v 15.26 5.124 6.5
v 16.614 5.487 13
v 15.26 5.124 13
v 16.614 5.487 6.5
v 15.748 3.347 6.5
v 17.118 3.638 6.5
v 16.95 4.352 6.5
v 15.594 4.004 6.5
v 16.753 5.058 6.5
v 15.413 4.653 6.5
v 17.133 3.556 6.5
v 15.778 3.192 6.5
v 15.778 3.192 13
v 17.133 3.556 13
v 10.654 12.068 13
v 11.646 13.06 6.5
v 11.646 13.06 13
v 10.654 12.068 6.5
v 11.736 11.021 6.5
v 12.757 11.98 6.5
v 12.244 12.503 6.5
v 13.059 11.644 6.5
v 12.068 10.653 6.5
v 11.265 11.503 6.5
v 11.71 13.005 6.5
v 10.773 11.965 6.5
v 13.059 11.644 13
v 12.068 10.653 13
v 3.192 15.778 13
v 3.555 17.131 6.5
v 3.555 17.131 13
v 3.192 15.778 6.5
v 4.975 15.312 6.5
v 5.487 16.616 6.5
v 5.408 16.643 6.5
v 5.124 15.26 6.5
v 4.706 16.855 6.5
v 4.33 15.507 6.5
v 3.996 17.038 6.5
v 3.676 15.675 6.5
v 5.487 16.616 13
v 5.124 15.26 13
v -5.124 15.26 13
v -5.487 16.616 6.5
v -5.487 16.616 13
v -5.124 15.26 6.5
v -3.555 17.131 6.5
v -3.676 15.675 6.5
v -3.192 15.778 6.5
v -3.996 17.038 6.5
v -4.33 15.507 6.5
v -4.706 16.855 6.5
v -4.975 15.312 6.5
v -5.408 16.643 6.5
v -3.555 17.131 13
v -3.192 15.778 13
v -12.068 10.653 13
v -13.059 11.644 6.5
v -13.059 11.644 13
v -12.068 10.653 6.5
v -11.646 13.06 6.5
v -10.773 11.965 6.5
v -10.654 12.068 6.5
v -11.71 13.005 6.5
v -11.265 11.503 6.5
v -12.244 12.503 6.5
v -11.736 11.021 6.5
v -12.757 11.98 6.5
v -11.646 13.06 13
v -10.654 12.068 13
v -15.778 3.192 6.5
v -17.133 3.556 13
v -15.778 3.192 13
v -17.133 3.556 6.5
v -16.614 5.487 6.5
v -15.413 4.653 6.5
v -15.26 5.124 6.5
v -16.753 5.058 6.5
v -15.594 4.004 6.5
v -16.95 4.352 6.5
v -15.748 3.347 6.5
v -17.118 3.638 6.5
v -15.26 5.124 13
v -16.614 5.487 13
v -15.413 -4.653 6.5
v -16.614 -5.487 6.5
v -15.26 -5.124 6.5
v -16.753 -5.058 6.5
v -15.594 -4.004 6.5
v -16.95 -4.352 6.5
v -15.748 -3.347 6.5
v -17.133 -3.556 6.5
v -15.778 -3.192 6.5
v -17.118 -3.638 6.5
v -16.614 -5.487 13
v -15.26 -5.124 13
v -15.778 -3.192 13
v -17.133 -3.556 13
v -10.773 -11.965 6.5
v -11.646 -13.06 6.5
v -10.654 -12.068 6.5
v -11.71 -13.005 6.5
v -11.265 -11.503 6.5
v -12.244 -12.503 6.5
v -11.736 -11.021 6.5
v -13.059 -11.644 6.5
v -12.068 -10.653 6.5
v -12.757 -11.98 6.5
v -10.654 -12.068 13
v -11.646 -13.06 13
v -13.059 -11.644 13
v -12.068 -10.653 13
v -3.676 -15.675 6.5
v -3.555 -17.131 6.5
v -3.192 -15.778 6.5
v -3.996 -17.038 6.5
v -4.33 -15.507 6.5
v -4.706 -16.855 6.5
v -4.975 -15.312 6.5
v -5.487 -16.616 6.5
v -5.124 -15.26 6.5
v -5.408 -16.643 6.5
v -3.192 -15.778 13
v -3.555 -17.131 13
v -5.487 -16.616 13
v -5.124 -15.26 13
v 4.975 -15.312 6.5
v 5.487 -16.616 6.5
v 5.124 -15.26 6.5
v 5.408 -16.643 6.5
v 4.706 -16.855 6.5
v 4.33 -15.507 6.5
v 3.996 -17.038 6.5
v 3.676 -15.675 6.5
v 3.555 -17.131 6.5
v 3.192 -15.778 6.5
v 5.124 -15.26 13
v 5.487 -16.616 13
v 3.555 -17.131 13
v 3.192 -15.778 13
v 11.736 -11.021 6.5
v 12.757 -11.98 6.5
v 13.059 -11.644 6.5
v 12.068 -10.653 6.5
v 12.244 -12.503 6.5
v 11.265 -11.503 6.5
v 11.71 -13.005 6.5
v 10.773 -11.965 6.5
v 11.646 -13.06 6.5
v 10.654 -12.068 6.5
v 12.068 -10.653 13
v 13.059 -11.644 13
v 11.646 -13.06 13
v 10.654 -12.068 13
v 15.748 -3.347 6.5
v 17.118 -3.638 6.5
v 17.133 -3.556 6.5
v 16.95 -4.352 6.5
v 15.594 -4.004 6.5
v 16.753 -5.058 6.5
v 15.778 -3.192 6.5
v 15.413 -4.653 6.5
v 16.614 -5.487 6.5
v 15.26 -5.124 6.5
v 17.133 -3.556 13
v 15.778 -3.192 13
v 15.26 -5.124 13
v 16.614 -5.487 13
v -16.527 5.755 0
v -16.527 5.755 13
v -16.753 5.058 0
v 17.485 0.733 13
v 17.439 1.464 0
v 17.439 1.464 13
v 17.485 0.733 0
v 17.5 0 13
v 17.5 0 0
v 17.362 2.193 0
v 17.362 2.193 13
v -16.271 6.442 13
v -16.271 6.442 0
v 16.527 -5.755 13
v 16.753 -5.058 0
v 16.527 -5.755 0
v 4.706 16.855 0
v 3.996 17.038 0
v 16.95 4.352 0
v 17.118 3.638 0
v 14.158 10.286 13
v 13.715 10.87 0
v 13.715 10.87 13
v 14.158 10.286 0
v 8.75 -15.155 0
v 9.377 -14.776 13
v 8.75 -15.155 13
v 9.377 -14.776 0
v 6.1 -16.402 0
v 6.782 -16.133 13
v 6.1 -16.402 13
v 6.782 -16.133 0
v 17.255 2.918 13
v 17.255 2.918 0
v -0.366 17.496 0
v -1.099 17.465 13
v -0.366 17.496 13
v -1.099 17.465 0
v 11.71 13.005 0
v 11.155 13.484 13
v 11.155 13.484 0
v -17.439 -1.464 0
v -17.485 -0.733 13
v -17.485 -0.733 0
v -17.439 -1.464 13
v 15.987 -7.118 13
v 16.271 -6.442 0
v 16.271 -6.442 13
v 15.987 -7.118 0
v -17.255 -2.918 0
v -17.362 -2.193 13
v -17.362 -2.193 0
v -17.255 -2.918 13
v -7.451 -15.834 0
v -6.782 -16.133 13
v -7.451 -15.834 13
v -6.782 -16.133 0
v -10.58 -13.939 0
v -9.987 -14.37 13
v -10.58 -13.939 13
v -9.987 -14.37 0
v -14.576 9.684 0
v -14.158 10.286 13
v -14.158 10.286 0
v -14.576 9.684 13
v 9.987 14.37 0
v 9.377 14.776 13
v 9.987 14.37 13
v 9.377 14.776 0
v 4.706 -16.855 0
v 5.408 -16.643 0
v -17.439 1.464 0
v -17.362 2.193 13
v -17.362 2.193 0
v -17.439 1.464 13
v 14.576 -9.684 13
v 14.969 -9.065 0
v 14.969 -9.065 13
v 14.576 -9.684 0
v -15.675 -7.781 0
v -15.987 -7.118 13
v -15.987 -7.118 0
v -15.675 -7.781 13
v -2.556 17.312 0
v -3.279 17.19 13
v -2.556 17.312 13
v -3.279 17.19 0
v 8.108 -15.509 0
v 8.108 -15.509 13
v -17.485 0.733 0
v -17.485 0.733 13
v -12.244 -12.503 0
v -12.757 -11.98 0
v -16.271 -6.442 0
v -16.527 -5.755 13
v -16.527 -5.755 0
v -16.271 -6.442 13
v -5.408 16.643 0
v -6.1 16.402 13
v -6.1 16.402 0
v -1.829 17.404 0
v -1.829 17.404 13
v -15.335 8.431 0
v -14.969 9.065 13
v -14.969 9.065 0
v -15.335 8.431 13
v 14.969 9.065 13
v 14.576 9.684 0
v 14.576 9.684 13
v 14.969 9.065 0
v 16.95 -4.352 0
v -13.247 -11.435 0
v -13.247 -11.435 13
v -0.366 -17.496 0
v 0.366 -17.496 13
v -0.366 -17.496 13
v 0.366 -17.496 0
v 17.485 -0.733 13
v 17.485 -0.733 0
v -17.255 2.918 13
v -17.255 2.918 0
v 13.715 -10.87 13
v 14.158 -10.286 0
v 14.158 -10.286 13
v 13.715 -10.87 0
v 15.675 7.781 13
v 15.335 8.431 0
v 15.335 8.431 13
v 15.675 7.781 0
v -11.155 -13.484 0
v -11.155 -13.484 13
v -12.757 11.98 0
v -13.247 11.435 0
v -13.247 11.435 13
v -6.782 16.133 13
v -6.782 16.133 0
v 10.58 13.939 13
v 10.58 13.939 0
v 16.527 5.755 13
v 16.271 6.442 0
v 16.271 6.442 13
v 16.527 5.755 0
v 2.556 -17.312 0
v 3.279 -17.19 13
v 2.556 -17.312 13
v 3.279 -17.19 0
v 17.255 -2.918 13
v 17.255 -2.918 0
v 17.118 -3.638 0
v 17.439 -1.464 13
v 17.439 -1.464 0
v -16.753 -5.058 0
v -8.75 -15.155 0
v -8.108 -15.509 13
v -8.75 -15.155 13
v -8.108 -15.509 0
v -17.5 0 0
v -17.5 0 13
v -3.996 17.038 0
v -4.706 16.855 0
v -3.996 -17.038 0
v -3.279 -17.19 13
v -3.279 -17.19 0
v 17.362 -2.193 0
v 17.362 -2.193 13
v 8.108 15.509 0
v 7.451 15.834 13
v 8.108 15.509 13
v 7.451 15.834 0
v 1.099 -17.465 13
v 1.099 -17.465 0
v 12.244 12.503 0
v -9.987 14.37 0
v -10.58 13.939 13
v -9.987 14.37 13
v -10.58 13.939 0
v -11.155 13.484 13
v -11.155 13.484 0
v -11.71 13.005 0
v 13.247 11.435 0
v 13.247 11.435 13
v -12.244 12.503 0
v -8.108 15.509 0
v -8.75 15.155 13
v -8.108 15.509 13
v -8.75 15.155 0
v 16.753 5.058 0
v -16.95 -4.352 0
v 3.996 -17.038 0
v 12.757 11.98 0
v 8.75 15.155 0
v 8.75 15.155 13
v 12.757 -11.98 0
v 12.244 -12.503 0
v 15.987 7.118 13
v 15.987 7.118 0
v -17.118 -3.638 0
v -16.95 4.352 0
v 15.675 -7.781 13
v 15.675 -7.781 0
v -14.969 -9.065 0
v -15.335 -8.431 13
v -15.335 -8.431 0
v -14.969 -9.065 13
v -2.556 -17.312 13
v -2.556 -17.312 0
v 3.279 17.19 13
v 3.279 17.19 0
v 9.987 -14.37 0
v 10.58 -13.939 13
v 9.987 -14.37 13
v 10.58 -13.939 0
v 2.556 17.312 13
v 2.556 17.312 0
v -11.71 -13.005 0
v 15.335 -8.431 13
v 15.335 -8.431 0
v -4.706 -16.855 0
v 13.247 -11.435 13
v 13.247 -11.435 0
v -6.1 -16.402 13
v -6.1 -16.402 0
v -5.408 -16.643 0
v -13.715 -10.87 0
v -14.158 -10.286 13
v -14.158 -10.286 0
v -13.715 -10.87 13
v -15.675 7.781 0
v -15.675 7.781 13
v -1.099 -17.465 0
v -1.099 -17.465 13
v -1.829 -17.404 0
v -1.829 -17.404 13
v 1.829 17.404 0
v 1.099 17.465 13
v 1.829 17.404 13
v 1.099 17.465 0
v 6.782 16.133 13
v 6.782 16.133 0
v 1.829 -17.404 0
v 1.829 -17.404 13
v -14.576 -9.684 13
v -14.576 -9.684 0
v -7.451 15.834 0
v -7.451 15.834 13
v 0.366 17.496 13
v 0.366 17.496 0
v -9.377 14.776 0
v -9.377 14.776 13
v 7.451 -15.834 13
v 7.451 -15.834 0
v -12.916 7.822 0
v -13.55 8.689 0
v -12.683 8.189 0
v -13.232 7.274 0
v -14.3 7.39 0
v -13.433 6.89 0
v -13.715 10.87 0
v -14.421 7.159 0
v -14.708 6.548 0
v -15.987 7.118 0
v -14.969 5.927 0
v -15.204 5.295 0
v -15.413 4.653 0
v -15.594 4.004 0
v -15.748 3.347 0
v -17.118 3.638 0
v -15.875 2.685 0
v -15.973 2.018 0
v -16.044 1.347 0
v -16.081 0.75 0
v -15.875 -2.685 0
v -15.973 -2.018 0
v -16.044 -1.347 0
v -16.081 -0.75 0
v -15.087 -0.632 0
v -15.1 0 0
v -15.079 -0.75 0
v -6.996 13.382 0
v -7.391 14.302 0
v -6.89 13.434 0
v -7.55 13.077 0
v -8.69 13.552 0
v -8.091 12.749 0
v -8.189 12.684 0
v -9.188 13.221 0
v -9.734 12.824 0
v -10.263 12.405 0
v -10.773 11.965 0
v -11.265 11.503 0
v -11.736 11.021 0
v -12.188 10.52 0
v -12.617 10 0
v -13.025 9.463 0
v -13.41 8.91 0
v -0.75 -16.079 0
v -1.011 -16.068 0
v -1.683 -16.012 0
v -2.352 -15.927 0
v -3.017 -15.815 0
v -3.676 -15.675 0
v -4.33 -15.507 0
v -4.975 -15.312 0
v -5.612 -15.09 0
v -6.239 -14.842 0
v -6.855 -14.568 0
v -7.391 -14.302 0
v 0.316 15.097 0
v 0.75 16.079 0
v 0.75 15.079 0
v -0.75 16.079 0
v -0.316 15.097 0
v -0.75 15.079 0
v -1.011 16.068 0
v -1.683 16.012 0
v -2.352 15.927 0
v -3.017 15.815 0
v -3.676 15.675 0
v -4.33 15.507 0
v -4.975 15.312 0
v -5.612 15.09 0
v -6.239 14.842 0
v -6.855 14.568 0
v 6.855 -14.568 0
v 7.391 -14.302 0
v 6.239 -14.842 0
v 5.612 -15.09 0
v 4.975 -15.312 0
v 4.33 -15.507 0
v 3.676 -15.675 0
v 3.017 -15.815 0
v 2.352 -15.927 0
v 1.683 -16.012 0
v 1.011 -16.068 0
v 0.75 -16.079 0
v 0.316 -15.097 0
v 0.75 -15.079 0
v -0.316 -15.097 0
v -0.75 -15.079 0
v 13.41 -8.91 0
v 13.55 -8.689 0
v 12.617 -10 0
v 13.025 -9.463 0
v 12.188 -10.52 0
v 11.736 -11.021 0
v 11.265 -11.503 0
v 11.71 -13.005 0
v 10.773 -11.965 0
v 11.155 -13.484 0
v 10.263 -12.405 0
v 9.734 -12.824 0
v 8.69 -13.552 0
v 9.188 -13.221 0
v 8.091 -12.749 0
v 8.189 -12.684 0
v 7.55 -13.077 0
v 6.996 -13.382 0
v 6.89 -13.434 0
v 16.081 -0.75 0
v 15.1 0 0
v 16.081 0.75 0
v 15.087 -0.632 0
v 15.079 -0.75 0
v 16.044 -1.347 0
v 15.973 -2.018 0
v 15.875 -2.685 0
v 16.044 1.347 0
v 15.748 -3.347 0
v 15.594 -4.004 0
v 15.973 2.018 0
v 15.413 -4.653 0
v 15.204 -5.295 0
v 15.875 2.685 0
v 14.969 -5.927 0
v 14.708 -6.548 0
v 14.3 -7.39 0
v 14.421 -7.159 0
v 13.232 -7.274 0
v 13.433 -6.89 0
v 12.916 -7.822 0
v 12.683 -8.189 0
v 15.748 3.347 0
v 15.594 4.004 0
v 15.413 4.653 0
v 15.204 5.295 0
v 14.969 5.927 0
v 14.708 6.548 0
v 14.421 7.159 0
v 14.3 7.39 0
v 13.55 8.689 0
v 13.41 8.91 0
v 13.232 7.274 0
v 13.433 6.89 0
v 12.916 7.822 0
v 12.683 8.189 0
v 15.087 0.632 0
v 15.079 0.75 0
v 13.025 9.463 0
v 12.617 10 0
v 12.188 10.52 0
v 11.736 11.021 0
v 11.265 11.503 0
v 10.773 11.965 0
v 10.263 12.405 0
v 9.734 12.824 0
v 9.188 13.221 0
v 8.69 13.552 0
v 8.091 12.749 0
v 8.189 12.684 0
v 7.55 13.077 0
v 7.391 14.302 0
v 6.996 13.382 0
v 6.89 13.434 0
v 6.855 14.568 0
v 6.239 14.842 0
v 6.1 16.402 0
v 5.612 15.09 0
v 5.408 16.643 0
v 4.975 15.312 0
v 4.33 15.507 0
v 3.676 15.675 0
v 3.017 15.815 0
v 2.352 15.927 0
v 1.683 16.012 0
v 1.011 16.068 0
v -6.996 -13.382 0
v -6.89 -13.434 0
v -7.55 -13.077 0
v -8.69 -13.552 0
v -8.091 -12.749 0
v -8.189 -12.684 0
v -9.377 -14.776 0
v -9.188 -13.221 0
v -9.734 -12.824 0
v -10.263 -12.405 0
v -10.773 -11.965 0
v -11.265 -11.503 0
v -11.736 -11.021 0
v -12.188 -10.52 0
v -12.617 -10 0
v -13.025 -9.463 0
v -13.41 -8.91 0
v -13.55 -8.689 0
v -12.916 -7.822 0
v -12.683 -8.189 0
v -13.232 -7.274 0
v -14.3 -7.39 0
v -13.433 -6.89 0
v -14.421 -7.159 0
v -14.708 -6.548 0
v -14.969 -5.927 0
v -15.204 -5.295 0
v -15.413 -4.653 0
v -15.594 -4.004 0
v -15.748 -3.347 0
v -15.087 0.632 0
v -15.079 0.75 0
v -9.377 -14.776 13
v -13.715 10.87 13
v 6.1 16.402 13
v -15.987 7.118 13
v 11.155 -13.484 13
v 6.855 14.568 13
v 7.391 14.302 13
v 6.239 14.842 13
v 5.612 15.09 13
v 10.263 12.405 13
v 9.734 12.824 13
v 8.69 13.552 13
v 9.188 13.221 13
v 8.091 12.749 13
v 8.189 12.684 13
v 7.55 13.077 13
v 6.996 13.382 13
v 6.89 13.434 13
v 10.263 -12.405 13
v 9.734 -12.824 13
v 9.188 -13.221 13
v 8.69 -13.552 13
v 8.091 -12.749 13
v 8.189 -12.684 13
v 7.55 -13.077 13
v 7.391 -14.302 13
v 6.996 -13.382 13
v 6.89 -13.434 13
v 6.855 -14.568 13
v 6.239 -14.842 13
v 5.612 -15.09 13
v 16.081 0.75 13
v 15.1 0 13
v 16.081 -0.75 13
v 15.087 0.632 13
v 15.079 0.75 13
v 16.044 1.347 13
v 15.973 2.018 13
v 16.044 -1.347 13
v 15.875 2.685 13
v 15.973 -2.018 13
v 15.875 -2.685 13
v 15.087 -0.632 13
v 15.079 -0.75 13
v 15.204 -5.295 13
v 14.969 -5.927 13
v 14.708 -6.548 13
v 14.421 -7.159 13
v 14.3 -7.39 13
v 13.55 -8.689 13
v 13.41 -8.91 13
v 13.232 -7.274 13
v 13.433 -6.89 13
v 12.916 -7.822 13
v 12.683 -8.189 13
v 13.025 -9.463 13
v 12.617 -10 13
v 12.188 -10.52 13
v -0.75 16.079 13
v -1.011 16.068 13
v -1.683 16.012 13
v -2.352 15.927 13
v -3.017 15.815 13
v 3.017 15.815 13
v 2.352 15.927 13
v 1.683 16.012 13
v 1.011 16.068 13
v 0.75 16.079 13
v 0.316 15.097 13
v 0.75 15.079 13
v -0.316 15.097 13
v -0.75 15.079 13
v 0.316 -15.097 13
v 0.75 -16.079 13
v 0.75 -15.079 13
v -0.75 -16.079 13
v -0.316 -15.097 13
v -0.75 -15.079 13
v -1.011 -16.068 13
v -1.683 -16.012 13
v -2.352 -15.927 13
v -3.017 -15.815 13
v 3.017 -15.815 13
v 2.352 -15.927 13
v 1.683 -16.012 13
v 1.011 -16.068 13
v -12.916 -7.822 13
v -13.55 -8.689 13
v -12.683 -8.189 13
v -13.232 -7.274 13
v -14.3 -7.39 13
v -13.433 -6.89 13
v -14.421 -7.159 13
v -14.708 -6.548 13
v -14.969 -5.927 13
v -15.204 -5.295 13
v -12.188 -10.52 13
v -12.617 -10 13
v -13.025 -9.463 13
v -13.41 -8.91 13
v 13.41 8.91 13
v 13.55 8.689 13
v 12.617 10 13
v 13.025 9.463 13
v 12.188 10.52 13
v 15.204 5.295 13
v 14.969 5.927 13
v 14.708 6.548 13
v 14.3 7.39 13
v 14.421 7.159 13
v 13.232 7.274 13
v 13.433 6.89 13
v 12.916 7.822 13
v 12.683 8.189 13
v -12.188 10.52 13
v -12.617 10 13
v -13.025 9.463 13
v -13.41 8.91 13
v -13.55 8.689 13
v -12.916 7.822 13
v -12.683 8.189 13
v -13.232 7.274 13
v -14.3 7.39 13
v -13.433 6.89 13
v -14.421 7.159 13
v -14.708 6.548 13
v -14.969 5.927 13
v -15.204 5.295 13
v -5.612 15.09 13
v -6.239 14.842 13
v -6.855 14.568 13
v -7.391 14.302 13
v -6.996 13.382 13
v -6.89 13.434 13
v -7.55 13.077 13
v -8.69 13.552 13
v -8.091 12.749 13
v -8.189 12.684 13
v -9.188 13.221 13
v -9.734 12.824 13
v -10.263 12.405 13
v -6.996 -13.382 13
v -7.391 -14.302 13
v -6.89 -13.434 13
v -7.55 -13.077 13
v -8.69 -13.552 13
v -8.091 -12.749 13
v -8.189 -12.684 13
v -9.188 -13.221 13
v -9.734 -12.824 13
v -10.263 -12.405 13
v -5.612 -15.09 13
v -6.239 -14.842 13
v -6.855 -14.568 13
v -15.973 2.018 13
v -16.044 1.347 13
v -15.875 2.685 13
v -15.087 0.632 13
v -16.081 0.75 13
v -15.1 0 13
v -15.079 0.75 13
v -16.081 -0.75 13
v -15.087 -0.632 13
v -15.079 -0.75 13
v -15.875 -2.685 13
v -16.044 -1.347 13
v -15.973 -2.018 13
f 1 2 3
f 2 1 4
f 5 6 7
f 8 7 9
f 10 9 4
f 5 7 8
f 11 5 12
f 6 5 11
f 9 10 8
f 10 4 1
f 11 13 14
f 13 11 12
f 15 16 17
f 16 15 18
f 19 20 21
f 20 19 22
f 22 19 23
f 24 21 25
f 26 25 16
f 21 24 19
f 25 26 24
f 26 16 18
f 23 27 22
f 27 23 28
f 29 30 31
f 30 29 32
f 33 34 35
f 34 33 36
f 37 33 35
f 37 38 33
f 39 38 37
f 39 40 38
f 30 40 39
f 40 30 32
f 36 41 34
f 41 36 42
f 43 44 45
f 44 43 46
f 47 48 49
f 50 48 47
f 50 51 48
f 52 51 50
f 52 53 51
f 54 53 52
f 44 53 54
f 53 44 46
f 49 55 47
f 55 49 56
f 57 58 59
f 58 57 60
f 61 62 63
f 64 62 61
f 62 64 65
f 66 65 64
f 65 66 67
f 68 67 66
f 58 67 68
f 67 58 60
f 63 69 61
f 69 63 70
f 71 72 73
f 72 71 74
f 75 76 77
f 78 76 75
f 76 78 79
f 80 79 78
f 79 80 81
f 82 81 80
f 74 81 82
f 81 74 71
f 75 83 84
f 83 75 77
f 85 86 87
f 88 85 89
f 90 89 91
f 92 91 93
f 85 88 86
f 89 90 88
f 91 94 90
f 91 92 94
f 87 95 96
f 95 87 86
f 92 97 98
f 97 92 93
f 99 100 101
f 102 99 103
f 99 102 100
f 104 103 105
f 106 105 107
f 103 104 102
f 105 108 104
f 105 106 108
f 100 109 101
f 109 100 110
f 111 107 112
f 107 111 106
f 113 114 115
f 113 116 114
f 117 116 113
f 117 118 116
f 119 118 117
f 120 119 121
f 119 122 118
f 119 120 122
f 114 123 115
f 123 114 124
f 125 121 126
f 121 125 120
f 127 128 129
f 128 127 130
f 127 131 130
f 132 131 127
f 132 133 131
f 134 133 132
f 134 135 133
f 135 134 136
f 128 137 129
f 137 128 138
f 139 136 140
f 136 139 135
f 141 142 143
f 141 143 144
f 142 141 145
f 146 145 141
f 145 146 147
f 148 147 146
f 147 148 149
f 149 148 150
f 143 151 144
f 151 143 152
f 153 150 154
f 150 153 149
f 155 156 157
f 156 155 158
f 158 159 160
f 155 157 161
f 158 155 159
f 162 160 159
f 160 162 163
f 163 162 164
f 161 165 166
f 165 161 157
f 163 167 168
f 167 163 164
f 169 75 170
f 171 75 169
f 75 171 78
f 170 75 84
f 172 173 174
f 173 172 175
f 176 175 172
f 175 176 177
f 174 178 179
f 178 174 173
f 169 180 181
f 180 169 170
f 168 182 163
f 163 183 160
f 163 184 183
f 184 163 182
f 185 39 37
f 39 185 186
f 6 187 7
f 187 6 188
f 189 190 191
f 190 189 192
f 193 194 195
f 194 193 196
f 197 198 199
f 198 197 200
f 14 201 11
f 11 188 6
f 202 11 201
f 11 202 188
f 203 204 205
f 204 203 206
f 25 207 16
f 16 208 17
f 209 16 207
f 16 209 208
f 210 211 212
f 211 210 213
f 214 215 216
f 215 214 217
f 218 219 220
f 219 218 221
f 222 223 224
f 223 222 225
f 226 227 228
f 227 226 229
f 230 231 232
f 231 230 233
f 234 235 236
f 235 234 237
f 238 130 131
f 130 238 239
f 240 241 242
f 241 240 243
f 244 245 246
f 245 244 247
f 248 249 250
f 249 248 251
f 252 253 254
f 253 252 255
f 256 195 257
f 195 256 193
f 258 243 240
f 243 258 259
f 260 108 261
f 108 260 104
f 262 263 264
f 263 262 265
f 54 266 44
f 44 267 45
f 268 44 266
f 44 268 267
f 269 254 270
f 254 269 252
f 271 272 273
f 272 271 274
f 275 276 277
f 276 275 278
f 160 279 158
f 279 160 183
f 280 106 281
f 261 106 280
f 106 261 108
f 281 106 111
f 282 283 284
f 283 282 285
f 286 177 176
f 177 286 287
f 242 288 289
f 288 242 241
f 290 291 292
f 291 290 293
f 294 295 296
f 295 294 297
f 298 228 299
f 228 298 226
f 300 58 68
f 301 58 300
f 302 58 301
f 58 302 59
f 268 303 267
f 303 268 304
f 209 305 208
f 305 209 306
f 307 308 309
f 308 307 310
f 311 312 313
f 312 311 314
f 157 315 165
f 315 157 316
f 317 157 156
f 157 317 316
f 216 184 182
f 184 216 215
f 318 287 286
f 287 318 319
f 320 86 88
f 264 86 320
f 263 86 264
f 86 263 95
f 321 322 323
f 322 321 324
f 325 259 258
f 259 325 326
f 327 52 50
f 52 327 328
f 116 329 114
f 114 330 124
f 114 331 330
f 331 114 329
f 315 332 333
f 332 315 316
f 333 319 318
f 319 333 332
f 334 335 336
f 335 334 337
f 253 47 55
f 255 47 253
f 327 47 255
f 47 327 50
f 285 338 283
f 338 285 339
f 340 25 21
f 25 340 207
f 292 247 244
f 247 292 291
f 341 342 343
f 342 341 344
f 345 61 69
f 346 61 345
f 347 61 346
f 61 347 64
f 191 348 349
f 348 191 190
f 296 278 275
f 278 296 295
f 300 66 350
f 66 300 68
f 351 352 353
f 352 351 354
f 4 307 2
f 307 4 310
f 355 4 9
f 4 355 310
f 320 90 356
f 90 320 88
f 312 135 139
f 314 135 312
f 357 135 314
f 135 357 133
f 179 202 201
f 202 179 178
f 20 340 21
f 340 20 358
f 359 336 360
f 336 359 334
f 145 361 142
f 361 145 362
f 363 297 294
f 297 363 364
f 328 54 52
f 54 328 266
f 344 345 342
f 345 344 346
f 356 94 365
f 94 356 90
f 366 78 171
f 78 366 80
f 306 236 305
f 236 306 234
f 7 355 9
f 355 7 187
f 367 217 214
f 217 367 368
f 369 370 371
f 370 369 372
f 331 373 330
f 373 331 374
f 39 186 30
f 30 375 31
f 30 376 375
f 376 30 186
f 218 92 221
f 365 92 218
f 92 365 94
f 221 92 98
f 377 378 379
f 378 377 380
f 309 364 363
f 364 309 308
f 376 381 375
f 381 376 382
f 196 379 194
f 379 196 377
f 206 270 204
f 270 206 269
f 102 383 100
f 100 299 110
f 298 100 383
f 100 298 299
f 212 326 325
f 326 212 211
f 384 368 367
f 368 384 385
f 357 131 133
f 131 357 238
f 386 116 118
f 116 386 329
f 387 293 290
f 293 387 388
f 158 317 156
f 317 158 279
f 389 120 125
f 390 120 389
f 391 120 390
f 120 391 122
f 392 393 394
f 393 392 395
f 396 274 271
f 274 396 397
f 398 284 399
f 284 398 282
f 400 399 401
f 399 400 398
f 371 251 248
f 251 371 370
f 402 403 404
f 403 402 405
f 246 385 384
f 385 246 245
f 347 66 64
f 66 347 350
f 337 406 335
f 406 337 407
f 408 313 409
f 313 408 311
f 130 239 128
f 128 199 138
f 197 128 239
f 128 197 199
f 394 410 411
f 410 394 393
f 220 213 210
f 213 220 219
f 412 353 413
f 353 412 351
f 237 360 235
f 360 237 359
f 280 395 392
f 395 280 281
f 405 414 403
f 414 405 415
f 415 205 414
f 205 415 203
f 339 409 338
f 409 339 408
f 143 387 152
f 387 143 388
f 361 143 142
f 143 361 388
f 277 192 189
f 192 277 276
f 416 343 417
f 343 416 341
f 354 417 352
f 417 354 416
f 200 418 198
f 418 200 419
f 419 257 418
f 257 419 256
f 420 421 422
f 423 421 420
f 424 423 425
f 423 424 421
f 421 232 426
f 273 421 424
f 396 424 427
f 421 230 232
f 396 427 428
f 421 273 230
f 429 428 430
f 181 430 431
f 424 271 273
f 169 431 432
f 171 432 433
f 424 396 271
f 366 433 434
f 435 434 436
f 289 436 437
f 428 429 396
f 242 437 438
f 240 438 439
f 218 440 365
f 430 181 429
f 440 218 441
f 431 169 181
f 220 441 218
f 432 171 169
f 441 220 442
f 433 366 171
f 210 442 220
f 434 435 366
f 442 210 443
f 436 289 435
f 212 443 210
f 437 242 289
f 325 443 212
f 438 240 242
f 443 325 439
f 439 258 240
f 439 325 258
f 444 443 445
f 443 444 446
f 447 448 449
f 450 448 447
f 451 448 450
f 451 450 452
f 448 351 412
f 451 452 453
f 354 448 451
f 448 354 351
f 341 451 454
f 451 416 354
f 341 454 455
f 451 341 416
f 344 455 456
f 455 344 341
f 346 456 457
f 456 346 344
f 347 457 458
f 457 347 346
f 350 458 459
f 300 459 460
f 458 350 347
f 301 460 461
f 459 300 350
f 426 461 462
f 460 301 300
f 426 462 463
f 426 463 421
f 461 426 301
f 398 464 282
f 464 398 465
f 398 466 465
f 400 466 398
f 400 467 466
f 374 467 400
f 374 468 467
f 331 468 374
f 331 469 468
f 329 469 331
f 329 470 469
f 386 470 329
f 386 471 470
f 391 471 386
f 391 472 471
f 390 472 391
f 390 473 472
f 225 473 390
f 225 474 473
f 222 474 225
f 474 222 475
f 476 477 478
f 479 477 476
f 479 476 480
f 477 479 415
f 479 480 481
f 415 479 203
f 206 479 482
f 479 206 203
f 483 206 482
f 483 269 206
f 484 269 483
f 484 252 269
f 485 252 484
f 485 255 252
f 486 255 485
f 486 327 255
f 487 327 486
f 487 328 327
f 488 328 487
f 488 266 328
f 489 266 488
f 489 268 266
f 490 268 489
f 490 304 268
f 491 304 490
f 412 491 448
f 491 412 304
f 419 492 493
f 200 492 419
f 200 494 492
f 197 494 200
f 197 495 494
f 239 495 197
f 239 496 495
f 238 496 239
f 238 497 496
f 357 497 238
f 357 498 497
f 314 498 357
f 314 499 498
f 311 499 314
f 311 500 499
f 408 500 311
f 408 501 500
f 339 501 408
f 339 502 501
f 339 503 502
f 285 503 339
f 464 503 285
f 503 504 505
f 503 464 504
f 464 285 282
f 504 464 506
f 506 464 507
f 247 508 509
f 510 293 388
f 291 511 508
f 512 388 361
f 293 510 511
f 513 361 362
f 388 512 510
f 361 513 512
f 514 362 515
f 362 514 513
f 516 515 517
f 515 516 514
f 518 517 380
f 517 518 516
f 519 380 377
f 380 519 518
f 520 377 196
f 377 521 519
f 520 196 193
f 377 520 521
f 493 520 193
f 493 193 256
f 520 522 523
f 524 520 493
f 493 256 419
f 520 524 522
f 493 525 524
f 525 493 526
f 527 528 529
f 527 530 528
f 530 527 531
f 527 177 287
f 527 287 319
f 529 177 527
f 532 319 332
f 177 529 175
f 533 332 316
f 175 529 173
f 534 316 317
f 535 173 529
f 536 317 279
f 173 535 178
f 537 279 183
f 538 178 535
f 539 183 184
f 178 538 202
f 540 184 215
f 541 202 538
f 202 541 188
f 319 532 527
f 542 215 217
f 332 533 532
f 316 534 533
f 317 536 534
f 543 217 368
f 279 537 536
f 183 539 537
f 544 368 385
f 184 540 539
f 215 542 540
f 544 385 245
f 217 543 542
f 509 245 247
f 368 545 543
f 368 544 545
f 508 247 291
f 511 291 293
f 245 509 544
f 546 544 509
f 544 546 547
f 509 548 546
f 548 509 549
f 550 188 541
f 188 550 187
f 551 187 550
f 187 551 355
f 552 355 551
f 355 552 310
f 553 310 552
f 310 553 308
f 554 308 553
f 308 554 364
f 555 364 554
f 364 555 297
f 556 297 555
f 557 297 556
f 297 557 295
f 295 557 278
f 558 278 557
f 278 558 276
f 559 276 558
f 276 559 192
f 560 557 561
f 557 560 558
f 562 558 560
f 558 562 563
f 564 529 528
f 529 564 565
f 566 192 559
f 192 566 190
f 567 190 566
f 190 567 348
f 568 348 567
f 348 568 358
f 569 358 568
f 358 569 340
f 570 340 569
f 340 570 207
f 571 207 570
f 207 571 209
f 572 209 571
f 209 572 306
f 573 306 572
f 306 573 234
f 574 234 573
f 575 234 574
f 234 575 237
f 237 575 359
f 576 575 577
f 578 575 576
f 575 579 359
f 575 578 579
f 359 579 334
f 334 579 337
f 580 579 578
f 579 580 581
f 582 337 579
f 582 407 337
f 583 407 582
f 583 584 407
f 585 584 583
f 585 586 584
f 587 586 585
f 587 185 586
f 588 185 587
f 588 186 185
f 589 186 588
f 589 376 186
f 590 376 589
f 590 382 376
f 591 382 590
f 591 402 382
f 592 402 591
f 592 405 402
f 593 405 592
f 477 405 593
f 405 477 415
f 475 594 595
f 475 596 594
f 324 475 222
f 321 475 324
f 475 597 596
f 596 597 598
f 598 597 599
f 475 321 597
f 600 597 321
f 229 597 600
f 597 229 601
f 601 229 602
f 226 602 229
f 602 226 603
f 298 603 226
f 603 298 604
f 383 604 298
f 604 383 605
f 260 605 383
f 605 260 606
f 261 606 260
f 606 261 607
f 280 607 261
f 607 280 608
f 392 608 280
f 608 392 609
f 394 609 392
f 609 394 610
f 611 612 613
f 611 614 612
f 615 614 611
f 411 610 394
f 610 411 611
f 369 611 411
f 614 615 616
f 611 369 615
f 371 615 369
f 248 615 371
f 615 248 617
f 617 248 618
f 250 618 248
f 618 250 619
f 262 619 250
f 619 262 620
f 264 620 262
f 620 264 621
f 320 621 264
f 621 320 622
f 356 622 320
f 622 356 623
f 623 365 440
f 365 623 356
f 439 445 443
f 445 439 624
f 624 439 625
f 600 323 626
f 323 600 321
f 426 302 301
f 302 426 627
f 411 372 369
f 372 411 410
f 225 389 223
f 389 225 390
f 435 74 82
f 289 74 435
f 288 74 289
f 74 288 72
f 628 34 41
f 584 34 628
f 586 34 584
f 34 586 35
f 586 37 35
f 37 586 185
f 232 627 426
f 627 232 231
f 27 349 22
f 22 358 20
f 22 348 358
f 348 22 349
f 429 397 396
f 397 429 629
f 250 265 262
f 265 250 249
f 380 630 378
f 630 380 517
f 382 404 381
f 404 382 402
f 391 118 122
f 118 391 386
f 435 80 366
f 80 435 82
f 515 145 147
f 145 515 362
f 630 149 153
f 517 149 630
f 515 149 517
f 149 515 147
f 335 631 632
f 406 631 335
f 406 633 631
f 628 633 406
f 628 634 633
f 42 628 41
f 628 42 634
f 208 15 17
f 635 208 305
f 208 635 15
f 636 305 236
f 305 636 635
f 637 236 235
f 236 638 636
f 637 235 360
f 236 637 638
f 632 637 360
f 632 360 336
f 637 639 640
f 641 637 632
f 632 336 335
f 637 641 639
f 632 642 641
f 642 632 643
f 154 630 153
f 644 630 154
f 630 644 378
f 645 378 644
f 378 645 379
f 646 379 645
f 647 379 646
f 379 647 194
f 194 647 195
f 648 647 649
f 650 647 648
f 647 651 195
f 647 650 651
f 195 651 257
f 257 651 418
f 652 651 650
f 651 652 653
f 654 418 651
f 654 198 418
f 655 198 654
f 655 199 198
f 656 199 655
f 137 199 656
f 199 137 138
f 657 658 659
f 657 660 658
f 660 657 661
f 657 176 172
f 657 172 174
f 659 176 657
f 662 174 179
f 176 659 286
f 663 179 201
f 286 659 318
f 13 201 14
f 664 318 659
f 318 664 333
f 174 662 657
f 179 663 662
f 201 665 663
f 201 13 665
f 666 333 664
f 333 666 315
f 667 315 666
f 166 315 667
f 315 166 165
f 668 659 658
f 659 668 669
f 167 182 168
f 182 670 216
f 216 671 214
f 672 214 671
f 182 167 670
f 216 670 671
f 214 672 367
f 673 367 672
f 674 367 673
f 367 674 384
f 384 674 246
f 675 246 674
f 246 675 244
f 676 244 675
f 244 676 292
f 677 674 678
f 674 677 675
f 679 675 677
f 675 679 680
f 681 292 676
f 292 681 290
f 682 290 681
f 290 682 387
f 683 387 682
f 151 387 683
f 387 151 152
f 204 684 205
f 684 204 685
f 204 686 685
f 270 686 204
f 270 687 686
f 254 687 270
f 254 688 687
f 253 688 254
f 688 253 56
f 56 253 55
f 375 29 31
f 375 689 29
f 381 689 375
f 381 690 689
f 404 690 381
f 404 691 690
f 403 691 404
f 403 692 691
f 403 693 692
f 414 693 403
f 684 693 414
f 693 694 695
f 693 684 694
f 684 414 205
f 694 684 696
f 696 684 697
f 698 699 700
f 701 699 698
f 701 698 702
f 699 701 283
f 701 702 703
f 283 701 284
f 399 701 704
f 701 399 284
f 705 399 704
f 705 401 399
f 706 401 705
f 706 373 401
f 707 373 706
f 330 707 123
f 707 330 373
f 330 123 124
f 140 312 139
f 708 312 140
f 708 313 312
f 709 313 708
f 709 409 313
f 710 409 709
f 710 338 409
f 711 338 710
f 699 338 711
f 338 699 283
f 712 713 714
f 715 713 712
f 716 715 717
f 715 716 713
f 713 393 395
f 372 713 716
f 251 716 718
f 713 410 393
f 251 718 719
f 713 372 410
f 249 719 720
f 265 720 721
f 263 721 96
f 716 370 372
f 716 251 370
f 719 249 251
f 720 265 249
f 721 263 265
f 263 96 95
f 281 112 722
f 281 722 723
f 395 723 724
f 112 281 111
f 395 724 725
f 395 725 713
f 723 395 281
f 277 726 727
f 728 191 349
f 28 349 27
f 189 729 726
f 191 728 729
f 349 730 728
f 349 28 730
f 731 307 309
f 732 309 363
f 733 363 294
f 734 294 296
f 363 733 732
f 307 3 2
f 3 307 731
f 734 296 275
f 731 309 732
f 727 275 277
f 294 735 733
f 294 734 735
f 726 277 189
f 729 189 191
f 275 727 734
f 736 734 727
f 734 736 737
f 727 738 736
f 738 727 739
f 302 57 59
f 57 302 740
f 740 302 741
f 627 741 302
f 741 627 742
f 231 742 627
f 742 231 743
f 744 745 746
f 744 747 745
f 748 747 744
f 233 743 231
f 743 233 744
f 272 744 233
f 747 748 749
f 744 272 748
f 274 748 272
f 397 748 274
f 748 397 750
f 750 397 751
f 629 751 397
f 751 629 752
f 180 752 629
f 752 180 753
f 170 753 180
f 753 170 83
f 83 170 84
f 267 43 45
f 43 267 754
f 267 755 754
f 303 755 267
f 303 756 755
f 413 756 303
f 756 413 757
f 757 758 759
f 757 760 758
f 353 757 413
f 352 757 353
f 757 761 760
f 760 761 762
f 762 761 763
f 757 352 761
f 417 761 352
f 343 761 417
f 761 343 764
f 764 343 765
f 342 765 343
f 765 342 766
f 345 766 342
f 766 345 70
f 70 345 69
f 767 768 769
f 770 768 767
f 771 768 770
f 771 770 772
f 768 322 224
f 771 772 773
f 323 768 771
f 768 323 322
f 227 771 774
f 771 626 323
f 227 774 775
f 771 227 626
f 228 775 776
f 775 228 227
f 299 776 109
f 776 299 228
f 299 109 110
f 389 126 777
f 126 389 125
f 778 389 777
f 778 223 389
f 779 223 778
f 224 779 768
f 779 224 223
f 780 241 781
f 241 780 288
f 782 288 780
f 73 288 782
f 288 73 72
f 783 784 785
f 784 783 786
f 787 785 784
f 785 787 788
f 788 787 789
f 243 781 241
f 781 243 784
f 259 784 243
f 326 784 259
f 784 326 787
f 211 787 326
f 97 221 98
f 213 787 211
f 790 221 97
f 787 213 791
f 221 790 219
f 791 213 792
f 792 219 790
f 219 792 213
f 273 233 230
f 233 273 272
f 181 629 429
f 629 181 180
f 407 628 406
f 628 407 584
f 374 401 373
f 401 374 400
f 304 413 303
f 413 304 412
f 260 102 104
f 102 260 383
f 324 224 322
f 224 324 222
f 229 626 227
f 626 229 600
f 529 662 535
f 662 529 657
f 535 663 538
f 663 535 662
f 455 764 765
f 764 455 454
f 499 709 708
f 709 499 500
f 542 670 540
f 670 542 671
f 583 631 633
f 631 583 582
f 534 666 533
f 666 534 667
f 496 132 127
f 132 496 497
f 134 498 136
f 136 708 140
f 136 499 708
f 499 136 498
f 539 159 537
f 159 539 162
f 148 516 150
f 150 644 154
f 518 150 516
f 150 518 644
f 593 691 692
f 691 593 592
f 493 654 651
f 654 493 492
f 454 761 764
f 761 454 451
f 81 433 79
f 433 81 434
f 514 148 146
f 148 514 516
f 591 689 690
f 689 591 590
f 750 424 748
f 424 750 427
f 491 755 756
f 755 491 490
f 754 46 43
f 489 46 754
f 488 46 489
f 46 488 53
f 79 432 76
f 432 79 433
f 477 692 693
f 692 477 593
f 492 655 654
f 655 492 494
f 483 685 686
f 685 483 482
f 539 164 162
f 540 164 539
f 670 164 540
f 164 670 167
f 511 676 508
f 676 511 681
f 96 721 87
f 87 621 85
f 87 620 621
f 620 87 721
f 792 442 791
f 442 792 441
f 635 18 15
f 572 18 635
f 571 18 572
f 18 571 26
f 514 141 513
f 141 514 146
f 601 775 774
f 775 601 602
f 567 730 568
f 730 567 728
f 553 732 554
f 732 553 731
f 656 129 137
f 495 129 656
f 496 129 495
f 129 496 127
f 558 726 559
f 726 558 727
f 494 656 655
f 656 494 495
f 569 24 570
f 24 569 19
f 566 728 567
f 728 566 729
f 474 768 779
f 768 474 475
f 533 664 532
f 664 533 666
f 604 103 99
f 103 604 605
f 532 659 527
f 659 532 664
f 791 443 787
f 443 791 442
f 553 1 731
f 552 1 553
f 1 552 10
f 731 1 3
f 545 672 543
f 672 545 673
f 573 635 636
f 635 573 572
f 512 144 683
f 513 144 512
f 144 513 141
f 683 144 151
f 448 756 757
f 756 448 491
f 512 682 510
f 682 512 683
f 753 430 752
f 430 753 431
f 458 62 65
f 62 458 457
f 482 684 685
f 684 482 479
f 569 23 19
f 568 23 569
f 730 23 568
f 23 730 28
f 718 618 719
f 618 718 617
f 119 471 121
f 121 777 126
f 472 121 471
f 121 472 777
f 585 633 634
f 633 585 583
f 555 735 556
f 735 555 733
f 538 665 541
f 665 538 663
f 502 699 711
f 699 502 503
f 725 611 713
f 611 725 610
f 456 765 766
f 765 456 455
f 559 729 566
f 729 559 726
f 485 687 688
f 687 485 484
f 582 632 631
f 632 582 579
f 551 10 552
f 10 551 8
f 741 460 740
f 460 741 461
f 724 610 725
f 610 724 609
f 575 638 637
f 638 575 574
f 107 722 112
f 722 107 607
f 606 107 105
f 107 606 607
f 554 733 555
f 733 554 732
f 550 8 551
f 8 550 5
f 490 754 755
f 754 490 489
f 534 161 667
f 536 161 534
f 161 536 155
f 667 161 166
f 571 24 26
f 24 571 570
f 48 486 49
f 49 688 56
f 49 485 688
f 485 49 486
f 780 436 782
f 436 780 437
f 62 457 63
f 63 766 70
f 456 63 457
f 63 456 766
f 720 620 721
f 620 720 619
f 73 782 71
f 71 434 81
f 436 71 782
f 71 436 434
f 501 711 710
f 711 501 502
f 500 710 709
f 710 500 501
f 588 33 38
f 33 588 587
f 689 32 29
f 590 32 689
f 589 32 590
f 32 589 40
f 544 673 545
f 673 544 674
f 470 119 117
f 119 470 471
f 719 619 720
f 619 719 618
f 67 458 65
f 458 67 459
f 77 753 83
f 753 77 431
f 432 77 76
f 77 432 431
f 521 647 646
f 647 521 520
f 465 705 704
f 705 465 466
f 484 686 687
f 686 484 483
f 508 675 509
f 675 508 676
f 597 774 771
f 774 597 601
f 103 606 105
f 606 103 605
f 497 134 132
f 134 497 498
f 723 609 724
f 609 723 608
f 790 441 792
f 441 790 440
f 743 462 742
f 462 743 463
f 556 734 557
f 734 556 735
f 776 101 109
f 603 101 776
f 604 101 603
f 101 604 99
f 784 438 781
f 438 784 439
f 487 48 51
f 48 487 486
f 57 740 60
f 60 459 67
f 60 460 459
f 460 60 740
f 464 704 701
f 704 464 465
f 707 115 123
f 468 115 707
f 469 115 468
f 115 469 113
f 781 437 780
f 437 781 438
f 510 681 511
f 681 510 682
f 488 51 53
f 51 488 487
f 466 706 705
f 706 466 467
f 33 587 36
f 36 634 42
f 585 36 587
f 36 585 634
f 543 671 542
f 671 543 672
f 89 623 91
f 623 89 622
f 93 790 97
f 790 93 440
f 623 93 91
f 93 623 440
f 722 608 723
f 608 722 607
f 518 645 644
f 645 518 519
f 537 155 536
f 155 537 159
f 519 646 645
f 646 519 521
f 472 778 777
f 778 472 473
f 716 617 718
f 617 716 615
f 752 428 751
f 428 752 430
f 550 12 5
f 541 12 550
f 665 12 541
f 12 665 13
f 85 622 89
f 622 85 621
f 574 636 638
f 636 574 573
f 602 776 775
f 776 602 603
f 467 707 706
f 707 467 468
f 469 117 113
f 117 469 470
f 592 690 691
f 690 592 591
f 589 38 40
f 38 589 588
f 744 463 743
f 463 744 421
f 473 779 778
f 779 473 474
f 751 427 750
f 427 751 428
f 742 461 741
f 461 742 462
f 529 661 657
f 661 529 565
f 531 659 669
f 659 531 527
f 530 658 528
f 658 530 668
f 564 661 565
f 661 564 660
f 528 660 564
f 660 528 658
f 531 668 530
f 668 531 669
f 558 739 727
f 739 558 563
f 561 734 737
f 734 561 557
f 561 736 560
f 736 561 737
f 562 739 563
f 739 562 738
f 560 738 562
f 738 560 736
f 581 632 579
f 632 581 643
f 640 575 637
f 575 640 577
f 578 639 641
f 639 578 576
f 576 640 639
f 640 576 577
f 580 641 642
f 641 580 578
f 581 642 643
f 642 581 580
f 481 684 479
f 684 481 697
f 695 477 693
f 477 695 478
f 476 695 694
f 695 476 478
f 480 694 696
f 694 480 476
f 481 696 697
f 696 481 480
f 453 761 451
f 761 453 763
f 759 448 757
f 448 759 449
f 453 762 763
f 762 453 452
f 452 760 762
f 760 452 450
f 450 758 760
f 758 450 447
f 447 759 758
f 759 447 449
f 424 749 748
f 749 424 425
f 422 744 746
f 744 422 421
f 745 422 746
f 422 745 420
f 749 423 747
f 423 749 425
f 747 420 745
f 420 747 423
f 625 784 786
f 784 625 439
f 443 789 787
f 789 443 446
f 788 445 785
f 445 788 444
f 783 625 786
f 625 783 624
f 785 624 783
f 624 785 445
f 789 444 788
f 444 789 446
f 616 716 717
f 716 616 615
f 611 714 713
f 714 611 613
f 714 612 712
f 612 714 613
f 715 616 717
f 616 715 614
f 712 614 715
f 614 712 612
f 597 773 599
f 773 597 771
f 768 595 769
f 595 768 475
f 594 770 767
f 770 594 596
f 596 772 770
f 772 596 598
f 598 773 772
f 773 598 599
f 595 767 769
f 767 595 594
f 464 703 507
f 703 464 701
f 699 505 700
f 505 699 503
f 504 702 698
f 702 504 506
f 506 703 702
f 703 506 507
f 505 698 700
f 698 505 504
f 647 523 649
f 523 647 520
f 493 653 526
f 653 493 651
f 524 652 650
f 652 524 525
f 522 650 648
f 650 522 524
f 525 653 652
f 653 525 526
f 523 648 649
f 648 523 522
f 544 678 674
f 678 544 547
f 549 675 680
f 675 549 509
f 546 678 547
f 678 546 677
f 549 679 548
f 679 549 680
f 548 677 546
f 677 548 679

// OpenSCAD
$fn=150;

EPS=0.004;

module rotor_body()
{
	difference()
	{
		union()
		{
			cylinder(d=35, h=13);
			*translate([0,0,13]) scale([1,1,2]) difference()
			{
				sphere(d=33);
				translate([0,0,-16.5]) cube(33, center=true);
			}
		}
		translate([0,0,-EPS]) cylinder(d=32.2, h=13+2*EPS);		
		for(angle = [0 : 360 / 12 : 360])
			rotate([0,0,angle+360/24]) translate([32.2/2,0,13]) cube([5,2,13], center=true);
	}
	for(angle = [0 : 360 / 12 : 360])
		difference()
		{
			rotate([0,0,angle]) translate([32.2/2,0,13/2]) cube([2.5,1.5,13], center=true);
			translate([0,0,-EPS]) cylinder(d=30.2, h=14);
		}
}

module blade_0(length, width, thickness, initial_angle, pitch_angle)
{
	translate([0,0,(width+thickness)/2*sin(initial_angle)])
		rotate([90,-initial_angle,90])
			linear_extrude(height=length, twist=pitch_angle)
				scale([3,1]) translate([0,-width]) difference()
				{
					circle(width);
					translate([0,-width-thickness]) circle(width*2);
				}
}

rotor_body();
*blade_0(200, 5, 10, 0, 0);
